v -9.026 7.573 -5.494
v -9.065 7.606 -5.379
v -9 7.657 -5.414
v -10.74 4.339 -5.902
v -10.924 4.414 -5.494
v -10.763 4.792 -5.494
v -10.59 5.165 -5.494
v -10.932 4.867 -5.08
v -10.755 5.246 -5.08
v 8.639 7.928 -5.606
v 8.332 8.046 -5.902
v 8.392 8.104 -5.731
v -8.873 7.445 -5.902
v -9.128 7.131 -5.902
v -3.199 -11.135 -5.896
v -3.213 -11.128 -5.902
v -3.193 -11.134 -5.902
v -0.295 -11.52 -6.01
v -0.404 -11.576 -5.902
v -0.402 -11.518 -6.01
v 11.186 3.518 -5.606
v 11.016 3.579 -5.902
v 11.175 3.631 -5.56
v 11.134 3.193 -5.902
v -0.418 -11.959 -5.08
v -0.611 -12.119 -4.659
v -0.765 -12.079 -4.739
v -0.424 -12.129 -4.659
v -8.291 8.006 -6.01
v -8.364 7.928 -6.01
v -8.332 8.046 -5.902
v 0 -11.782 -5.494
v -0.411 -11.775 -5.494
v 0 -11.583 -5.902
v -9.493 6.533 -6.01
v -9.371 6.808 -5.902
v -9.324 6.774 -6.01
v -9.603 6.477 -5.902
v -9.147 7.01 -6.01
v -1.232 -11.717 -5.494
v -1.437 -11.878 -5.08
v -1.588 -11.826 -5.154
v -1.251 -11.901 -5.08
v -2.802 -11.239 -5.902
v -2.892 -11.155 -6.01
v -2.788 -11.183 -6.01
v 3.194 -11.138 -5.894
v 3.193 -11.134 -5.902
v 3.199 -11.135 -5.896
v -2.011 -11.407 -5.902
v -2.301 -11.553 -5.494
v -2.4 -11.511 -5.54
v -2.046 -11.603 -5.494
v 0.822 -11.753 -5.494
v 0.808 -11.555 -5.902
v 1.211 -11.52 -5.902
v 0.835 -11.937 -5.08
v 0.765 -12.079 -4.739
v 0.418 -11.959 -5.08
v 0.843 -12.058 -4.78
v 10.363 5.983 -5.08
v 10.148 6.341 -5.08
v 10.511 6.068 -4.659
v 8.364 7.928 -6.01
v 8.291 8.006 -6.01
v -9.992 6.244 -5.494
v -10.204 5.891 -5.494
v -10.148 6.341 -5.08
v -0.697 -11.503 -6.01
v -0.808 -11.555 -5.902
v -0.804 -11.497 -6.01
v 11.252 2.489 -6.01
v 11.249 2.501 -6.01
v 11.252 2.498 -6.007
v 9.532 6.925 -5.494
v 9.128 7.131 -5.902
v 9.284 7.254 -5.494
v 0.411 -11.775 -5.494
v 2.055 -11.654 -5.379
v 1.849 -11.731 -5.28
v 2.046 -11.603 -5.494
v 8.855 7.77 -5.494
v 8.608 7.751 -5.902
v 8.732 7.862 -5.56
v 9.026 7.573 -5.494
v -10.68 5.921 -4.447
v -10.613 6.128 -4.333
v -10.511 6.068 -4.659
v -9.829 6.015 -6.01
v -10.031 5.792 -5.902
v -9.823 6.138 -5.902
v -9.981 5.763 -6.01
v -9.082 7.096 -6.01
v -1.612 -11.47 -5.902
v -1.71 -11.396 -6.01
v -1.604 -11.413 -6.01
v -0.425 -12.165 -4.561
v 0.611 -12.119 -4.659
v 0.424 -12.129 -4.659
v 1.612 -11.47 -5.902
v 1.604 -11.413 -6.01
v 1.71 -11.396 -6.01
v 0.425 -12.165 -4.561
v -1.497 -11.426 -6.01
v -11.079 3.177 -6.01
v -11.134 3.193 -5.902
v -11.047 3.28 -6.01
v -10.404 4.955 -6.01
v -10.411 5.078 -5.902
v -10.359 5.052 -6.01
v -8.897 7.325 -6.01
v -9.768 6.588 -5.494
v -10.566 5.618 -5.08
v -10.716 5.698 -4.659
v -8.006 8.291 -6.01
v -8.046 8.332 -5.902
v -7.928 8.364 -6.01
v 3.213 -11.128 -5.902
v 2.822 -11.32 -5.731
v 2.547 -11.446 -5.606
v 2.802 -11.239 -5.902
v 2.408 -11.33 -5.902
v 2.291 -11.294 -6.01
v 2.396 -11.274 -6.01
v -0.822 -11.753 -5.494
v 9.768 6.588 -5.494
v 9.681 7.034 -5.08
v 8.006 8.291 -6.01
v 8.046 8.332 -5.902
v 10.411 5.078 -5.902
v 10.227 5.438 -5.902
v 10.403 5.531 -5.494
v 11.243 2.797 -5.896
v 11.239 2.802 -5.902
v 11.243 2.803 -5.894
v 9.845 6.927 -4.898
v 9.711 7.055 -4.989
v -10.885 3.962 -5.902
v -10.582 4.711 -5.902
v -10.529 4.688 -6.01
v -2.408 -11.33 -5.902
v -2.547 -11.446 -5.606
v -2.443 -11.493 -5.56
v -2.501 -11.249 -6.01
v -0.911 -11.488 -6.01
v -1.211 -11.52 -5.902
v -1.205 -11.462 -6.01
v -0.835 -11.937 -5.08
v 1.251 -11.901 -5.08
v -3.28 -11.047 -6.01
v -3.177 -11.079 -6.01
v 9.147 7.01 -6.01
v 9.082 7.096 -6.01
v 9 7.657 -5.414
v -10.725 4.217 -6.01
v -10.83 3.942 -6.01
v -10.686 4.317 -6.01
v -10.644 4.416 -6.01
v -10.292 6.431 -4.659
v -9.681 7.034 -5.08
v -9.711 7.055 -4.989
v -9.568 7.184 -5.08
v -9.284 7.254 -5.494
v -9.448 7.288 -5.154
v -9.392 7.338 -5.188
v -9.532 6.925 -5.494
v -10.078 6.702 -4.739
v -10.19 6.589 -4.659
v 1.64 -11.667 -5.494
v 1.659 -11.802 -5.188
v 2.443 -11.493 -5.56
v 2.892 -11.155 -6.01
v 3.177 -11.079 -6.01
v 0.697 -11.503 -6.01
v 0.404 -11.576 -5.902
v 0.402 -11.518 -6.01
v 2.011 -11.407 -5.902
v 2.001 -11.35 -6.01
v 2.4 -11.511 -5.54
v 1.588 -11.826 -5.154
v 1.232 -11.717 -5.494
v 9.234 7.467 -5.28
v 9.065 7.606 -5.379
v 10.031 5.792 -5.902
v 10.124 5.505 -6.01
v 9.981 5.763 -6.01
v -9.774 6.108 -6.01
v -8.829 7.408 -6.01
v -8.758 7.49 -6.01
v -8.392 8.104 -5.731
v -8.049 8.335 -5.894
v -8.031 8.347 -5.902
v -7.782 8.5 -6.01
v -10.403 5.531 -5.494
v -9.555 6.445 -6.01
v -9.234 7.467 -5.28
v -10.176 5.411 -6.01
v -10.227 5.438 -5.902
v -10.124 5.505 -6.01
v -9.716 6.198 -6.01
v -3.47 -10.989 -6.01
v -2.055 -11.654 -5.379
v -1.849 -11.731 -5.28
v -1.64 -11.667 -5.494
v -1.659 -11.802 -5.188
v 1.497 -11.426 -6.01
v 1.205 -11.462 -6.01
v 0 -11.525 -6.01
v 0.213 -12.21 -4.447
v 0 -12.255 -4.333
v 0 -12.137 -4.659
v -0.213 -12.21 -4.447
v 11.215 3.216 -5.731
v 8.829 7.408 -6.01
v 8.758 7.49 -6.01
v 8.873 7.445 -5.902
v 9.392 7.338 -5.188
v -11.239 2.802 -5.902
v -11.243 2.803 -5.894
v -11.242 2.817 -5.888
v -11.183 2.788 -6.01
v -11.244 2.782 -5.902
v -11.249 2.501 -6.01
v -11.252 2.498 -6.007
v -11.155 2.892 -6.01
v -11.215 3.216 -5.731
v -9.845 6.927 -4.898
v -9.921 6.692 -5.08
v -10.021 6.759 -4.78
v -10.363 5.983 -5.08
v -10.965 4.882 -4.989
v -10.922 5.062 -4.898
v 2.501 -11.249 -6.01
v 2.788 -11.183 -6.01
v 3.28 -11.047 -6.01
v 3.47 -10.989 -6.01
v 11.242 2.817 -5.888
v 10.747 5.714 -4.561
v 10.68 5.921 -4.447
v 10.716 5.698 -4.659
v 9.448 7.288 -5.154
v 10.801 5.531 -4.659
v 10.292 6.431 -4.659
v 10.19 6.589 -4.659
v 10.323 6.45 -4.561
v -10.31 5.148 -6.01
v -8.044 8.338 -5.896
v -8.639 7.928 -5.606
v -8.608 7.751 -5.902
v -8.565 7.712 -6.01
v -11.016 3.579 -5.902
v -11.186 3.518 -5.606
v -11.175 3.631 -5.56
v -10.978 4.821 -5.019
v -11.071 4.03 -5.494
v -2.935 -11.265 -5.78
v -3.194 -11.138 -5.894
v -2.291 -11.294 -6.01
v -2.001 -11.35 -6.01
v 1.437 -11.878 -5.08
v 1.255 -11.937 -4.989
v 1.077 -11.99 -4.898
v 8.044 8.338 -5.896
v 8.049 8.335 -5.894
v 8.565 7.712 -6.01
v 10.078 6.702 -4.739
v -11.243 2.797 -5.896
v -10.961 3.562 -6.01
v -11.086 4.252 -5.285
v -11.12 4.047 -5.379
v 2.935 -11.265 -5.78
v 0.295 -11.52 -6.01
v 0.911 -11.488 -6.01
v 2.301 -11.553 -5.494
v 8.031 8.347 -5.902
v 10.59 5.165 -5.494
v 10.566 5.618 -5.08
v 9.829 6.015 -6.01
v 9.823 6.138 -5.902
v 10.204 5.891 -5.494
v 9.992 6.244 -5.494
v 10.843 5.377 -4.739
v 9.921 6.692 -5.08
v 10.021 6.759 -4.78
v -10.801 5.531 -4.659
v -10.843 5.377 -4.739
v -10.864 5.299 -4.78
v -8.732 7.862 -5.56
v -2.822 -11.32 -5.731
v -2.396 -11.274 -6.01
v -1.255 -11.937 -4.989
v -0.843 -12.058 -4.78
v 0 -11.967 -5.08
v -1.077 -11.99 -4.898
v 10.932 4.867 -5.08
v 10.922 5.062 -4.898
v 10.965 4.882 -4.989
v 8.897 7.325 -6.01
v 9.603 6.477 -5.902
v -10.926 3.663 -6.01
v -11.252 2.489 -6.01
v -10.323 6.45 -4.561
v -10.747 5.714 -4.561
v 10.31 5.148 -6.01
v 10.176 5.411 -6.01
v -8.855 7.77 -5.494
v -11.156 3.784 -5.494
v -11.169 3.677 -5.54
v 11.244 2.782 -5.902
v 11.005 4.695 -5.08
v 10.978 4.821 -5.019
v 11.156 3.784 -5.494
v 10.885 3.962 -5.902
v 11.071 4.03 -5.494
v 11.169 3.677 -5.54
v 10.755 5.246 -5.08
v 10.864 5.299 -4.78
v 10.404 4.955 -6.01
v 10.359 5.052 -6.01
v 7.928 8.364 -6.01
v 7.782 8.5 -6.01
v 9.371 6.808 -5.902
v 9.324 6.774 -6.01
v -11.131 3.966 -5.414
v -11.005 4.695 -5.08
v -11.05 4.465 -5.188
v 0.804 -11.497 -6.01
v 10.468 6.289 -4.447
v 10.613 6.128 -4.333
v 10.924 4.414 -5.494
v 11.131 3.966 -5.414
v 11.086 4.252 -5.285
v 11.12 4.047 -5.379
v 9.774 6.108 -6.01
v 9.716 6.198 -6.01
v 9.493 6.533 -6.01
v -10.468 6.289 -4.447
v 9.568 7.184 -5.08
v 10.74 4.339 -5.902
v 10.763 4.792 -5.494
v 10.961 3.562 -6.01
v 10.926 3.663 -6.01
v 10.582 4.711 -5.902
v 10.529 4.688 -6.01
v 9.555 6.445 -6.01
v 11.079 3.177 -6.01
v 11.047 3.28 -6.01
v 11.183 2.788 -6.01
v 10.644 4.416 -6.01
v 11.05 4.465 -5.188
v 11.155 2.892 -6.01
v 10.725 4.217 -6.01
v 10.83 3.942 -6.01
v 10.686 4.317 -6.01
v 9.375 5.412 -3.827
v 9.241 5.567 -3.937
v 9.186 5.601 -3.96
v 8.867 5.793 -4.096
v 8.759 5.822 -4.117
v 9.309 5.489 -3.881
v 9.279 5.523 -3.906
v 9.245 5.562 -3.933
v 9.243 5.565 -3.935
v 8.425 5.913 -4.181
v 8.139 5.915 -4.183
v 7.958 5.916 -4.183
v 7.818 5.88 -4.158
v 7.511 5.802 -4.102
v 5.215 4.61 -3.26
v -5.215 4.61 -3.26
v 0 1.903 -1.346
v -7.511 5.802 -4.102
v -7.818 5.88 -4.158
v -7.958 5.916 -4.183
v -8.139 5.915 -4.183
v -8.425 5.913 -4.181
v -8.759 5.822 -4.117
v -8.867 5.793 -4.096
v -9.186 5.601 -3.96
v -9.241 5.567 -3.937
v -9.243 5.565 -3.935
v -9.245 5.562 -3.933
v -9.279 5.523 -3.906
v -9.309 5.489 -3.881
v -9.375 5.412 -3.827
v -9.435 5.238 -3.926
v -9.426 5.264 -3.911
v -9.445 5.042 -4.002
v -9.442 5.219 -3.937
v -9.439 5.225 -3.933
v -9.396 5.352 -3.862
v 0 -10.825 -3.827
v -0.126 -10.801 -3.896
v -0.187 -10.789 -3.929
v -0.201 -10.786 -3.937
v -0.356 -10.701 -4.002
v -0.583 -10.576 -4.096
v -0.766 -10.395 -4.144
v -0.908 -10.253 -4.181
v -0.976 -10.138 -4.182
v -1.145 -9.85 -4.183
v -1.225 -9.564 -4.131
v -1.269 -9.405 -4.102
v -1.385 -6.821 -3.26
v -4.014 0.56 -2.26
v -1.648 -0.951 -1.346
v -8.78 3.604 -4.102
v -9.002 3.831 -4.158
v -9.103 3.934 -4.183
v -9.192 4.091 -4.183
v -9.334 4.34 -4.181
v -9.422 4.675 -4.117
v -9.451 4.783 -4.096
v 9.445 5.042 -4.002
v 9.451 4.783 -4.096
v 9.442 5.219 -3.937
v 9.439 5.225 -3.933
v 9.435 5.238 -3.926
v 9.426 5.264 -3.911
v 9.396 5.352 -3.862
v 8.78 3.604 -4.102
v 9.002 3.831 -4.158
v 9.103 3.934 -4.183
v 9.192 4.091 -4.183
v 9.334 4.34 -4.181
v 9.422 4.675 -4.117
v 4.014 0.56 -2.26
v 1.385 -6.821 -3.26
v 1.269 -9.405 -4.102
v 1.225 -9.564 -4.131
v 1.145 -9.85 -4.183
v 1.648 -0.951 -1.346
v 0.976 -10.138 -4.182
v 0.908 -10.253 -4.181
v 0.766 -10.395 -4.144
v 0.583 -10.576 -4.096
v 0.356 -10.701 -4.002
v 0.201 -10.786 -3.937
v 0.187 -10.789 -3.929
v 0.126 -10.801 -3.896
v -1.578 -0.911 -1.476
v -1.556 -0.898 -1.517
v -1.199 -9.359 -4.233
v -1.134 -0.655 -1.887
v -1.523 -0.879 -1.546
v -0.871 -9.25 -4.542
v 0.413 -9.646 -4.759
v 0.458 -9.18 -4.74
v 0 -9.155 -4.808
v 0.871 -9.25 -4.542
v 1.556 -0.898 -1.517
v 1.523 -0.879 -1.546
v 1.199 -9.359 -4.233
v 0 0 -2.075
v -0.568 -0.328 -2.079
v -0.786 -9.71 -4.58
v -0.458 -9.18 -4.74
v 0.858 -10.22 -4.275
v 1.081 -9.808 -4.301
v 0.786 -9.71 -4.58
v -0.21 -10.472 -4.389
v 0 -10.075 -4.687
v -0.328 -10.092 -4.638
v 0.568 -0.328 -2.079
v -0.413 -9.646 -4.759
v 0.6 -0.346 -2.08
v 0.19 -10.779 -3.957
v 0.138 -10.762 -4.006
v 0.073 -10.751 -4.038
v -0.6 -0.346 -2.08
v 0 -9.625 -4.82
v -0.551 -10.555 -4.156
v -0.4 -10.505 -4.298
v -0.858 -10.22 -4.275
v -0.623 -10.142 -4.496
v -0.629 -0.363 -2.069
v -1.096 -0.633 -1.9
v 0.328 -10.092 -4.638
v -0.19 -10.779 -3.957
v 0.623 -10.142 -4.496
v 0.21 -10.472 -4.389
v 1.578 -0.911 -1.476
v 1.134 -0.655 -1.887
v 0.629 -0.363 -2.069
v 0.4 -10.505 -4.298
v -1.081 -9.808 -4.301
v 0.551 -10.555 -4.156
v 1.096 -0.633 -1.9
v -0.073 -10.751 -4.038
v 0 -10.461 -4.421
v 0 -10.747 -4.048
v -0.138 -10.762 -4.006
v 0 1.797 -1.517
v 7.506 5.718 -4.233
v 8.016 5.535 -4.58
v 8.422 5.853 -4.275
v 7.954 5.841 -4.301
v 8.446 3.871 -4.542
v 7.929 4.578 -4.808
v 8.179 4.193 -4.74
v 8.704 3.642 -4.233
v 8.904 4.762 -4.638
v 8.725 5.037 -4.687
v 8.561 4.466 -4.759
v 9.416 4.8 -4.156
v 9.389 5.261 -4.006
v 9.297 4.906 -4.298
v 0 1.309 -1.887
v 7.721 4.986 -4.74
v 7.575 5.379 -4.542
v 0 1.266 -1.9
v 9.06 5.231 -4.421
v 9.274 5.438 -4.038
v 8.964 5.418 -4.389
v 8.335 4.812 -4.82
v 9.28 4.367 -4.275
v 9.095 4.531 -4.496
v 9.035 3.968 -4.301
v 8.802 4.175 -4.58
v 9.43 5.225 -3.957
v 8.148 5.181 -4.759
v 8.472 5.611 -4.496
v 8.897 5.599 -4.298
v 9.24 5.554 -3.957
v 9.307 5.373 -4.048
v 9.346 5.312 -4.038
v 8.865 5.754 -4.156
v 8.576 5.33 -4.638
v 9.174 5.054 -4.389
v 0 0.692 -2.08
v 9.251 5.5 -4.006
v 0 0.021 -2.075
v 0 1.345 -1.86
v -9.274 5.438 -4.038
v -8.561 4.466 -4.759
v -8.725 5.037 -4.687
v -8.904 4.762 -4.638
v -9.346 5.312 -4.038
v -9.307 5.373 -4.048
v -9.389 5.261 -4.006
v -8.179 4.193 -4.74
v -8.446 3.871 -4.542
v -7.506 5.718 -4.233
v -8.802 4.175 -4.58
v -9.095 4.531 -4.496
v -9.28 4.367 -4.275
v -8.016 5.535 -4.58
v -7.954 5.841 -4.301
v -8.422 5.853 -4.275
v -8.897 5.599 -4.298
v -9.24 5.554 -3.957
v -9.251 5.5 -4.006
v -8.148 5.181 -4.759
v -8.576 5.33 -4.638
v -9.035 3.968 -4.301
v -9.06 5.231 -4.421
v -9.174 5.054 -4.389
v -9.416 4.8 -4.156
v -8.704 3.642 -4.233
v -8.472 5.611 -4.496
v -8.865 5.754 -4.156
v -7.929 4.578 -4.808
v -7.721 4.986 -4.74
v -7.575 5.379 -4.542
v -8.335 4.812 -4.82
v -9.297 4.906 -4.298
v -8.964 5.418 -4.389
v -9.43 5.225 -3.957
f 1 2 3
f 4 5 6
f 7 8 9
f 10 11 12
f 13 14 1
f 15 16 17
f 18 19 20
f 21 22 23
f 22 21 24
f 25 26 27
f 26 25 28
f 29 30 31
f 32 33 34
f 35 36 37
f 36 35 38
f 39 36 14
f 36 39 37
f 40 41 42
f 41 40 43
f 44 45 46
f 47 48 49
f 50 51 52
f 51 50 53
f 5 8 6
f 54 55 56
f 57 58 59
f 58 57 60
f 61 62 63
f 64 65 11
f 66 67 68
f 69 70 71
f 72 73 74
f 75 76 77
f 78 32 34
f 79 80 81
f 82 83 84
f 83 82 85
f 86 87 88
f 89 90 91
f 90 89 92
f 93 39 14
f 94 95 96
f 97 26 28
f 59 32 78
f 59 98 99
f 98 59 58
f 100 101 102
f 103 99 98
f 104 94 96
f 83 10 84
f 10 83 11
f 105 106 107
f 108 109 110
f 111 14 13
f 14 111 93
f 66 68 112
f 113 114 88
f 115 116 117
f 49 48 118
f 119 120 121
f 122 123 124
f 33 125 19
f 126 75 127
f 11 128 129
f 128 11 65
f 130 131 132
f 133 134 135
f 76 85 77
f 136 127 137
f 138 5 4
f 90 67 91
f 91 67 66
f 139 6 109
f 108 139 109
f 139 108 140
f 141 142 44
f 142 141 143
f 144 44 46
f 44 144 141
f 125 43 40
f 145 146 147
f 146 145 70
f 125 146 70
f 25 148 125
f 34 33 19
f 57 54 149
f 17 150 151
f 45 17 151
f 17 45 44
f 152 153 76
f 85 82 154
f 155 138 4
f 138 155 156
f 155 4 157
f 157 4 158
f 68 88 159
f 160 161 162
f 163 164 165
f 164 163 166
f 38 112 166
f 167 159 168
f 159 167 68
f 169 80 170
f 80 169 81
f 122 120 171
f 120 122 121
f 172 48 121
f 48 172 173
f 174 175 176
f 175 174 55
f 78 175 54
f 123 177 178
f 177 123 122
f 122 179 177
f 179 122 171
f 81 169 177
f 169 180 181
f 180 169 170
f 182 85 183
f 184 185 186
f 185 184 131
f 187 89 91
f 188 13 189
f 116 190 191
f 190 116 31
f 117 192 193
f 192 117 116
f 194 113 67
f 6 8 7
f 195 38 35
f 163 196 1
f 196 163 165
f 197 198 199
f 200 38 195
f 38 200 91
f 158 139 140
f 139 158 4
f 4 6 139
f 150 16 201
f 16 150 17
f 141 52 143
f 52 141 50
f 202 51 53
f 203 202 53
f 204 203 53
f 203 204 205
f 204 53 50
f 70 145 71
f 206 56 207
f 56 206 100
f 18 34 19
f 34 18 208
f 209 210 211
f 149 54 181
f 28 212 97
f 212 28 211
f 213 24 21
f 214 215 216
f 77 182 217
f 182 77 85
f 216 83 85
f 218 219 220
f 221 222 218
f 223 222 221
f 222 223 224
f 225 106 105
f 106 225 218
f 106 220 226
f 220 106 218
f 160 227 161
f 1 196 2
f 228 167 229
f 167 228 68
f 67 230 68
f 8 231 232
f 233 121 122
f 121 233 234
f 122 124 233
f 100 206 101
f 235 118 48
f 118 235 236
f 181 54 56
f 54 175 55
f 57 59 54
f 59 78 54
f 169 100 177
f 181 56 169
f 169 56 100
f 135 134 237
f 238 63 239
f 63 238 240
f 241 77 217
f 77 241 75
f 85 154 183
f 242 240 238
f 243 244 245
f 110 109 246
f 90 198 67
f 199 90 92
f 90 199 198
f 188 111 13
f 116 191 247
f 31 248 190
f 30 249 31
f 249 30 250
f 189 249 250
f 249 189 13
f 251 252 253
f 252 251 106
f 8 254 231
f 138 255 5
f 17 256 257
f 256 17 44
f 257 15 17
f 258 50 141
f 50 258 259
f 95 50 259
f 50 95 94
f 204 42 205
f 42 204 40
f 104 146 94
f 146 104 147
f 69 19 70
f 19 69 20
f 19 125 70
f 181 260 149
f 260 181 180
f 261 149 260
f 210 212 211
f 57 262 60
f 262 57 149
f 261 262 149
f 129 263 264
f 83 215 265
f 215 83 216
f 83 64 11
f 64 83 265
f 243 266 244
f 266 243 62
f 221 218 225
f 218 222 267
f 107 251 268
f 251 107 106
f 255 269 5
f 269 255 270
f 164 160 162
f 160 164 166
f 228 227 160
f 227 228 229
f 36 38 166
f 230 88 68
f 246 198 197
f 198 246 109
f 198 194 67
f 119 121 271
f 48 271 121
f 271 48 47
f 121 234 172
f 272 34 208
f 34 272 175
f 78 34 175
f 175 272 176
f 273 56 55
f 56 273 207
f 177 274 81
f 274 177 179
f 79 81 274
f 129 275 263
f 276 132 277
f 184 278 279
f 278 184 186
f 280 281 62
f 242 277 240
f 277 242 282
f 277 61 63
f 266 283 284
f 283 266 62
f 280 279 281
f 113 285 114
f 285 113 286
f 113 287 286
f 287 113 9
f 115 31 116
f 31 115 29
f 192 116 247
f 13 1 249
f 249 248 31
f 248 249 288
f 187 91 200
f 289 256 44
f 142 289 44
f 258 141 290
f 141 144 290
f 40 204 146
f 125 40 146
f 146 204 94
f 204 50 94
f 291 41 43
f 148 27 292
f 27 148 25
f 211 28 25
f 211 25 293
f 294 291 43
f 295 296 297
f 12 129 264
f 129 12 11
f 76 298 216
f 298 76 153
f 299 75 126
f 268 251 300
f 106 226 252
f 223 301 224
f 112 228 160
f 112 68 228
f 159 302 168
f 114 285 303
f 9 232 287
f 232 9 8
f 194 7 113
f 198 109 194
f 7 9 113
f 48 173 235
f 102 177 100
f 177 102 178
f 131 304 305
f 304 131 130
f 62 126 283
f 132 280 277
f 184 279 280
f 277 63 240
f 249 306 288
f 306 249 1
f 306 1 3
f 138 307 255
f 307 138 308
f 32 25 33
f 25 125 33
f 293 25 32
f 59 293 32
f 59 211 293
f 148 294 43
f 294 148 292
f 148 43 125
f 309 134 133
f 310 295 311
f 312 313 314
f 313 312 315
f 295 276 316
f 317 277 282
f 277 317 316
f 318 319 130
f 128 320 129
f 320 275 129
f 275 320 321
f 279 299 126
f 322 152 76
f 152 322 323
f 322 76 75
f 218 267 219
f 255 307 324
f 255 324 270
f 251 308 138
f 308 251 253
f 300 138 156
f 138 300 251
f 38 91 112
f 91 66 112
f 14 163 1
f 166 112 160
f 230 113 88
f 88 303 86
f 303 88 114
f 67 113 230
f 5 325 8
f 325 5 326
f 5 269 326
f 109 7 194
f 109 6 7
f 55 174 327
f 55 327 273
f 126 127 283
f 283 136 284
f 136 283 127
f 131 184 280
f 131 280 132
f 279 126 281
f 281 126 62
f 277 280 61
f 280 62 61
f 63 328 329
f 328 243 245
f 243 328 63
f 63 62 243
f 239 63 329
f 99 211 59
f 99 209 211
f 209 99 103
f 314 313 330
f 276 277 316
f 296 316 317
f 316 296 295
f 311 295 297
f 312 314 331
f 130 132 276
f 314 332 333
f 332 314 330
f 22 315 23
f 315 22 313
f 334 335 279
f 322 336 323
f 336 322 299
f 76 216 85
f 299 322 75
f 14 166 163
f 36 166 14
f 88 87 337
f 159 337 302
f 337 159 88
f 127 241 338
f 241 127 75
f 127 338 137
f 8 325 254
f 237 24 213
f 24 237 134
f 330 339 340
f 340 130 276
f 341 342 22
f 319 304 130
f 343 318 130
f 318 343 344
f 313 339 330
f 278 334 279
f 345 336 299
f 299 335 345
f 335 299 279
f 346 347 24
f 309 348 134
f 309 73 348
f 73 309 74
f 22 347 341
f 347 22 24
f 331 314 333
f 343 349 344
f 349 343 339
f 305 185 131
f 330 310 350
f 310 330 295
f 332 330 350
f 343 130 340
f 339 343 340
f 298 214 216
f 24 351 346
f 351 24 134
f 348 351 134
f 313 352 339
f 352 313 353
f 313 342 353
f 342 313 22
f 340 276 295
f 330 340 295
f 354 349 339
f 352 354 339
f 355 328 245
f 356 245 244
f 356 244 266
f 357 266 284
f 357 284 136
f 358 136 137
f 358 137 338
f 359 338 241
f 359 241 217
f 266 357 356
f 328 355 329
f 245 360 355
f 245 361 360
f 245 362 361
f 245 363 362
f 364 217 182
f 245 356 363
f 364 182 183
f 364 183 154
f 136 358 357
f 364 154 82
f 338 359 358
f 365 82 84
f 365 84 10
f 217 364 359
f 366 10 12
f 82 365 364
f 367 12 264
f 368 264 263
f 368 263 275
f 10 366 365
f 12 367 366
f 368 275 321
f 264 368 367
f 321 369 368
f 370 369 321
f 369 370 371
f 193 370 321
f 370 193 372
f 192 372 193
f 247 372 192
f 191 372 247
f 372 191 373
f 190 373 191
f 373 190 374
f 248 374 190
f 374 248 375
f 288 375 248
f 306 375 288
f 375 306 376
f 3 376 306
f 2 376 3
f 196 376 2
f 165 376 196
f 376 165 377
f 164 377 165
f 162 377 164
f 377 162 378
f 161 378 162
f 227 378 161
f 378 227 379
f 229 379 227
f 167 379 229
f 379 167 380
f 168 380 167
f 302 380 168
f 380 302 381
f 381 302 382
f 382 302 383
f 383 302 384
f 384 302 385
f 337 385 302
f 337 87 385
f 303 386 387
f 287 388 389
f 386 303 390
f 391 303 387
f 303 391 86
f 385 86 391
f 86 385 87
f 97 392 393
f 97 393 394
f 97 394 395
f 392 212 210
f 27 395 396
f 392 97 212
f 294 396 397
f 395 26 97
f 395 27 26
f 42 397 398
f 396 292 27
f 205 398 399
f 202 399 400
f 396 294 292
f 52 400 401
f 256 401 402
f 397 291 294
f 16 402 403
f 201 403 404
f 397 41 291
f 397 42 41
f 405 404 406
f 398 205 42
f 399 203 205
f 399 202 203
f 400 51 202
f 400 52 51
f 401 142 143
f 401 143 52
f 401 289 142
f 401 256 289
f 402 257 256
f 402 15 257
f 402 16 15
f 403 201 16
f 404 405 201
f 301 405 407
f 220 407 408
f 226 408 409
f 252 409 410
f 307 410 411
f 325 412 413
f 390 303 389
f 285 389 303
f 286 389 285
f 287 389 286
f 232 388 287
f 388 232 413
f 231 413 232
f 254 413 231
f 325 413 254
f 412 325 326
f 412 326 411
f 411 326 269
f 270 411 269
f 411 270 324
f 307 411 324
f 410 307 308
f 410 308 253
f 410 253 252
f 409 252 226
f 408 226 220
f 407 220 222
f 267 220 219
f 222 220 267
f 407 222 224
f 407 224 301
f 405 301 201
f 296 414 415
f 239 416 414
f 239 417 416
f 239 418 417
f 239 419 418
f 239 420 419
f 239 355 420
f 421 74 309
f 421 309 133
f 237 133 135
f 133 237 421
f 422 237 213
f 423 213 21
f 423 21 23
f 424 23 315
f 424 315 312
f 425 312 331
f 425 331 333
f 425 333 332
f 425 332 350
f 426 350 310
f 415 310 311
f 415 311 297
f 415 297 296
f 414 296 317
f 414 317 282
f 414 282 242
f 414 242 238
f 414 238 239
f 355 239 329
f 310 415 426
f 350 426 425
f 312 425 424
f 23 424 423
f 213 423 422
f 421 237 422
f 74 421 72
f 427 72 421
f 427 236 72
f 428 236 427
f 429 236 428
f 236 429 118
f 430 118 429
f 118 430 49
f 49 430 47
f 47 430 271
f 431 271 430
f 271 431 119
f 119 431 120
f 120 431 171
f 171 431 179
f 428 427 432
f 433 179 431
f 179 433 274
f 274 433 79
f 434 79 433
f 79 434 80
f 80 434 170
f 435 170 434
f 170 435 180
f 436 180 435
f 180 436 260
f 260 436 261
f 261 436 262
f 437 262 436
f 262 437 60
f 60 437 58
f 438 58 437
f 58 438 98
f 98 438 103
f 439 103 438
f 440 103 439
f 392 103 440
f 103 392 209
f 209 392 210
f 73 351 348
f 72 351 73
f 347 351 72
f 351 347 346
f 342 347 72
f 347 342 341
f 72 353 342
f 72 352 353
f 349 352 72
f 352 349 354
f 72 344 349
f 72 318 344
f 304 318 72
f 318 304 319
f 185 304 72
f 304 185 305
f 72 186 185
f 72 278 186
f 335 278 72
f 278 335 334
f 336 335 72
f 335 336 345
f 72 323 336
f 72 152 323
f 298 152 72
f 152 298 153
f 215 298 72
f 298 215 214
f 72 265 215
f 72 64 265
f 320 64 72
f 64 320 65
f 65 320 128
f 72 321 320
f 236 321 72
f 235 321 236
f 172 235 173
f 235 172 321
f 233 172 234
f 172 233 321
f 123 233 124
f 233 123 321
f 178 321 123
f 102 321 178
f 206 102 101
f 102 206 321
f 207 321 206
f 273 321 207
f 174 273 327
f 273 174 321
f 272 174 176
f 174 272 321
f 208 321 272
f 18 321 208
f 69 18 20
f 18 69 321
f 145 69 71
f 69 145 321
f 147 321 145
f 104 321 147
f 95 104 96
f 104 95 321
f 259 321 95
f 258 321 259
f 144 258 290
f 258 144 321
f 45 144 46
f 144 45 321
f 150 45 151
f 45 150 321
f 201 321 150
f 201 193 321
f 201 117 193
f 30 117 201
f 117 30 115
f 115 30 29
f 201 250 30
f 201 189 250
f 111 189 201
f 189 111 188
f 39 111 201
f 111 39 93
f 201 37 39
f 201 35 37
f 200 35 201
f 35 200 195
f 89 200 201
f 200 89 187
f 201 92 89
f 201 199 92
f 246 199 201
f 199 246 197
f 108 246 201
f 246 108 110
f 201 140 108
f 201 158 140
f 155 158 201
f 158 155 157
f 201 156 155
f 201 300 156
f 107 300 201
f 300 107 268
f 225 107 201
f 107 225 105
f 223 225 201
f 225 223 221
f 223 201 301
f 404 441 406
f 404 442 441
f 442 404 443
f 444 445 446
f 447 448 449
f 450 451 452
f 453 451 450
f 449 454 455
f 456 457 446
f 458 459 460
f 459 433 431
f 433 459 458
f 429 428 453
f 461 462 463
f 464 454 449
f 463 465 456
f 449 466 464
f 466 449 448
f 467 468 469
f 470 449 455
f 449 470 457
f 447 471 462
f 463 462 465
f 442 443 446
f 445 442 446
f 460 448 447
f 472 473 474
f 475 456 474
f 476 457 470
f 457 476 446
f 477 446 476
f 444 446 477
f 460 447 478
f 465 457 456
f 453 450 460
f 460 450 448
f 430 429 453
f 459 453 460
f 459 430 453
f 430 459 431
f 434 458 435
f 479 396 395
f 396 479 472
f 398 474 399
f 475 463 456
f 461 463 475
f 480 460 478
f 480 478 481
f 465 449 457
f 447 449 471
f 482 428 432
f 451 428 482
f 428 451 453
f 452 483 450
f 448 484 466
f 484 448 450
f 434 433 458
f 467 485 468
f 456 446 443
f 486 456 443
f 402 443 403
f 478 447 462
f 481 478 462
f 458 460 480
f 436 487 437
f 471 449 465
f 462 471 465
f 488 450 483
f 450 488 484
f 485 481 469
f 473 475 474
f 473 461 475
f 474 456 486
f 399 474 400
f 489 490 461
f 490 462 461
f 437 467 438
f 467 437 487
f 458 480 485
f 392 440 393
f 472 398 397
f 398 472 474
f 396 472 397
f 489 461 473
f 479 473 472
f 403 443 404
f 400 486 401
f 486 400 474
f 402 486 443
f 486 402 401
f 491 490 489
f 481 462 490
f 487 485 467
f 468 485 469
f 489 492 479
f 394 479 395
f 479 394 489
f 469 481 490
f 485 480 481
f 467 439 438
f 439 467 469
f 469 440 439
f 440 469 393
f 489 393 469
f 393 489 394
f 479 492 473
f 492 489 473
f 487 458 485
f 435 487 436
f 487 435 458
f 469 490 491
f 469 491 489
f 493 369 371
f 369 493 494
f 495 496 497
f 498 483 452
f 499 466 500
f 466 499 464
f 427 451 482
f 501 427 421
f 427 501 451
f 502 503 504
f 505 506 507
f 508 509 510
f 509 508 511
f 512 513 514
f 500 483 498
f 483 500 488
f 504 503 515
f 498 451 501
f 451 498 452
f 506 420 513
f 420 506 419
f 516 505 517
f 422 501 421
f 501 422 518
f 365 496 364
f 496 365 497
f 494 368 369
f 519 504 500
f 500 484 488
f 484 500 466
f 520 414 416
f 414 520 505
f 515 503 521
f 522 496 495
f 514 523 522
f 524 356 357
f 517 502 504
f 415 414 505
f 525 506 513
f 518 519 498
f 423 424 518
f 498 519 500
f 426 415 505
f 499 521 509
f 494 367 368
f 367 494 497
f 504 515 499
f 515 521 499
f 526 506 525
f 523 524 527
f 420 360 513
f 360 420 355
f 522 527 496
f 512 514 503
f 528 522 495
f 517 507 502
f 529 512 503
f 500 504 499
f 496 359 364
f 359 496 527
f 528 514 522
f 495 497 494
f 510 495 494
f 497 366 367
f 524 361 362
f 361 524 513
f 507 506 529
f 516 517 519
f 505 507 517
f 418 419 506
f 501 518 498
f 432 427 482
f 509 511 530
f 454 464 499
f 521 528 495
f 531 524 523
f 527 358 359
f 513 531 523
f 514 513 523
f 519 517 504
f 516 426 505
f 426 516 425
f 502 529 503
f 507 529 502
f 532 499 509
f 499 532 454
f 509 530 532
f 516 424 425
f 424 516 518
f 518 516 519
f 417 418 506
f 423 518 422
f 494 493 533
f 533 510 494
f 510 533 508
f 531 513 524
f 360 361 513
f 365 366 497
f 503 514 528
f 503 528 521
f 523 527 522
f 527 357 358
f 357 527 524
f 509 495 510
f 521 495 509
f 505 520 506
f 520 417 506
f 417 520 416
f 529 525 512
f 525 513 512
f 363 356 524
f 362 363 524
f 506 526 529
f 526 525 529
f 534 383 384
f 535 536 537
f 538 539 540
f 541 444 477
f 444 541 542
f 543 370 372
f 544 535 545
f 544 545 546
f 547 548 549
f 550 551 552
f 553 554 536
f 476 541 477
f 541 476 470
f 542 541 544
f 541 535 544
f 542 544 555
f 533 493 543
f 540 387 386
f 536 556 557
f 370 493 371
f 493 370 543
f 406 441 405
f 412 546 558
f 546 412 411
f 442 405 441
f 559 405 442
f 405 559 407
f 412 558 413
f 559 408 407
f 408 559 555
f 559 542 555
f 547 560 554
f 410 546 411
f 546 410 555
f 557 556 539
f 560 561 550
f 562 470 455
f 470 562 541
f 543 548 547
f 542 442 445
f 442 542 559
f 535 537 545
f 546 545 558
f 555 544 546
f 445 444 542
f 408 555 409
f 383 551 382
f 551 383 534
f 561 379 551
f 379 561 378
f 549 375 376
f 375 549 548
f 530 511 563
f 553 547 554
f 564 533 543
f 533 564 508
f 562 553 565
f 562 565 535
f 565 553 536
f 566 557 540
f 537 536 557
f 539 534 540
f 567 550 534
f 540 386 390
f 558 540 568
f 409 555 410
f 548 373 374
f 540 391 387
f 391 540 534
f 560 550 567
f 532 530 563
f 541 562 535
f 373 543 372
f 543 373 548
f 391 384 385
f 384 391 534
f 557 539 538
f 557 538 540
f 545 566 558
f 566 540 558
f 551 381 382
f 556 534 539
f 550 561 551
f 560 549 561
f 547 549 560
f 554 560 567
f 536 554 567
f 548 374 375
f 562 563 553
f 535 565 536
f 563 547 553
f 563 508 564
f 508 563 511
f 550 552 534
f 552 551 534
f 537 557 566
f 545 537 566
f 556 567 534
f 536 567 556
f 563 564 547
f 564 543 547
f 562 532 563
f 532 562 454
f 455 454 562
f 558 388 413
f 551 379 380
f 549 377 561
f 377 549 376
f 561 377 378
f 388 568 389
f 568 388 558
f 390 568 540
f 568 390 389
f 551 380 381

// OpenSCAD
tetr_ang2=acos(1/sqrt(3));
tetr_ang=2*tetr_ang2;
module rod(){hull(){translate([0,0,10])sphere(1.5,$fn=20);sphere(2,$fn=20);}}
module tetr1(){
hull(){rotate([0,180-tetr_ang2,0])rod();
translate([0,0,-15])rotate([0,180-tetr_ang2,0])rod();}
hull(){rotate([0,180+tetr_ang2,0])rod();
translate([0,0,-15])rotate([0,180+tetr_ang2,0])rod();}
hull(){rotate([tetr_ang2,0,0])rod();translate([0,0,-15])rotate([tetr_ang2,0,0])rod();}
hull(){rotate([-tetr_ang2,0,0])rod();translate([0,0,-15])rotate([-tetr_ang2,0,0])rod();}
}
module tetr2(){
rod();
rotate([tetr_ang,0,0])rod();
rotate([tetr_ang,0,120])rod();
rotate([tetr_ang,0,-120])rod();
}
r1=17;
h=r1/sqrt(8);
module mold(){
difference(){
intersection(){
sphere(r=13,$fn=180);
translate([0,0,-h])rotate(30)cylinder( r1=r1,r2=0,h=h,$fn=3);}
tetr2();}

}
mold();
